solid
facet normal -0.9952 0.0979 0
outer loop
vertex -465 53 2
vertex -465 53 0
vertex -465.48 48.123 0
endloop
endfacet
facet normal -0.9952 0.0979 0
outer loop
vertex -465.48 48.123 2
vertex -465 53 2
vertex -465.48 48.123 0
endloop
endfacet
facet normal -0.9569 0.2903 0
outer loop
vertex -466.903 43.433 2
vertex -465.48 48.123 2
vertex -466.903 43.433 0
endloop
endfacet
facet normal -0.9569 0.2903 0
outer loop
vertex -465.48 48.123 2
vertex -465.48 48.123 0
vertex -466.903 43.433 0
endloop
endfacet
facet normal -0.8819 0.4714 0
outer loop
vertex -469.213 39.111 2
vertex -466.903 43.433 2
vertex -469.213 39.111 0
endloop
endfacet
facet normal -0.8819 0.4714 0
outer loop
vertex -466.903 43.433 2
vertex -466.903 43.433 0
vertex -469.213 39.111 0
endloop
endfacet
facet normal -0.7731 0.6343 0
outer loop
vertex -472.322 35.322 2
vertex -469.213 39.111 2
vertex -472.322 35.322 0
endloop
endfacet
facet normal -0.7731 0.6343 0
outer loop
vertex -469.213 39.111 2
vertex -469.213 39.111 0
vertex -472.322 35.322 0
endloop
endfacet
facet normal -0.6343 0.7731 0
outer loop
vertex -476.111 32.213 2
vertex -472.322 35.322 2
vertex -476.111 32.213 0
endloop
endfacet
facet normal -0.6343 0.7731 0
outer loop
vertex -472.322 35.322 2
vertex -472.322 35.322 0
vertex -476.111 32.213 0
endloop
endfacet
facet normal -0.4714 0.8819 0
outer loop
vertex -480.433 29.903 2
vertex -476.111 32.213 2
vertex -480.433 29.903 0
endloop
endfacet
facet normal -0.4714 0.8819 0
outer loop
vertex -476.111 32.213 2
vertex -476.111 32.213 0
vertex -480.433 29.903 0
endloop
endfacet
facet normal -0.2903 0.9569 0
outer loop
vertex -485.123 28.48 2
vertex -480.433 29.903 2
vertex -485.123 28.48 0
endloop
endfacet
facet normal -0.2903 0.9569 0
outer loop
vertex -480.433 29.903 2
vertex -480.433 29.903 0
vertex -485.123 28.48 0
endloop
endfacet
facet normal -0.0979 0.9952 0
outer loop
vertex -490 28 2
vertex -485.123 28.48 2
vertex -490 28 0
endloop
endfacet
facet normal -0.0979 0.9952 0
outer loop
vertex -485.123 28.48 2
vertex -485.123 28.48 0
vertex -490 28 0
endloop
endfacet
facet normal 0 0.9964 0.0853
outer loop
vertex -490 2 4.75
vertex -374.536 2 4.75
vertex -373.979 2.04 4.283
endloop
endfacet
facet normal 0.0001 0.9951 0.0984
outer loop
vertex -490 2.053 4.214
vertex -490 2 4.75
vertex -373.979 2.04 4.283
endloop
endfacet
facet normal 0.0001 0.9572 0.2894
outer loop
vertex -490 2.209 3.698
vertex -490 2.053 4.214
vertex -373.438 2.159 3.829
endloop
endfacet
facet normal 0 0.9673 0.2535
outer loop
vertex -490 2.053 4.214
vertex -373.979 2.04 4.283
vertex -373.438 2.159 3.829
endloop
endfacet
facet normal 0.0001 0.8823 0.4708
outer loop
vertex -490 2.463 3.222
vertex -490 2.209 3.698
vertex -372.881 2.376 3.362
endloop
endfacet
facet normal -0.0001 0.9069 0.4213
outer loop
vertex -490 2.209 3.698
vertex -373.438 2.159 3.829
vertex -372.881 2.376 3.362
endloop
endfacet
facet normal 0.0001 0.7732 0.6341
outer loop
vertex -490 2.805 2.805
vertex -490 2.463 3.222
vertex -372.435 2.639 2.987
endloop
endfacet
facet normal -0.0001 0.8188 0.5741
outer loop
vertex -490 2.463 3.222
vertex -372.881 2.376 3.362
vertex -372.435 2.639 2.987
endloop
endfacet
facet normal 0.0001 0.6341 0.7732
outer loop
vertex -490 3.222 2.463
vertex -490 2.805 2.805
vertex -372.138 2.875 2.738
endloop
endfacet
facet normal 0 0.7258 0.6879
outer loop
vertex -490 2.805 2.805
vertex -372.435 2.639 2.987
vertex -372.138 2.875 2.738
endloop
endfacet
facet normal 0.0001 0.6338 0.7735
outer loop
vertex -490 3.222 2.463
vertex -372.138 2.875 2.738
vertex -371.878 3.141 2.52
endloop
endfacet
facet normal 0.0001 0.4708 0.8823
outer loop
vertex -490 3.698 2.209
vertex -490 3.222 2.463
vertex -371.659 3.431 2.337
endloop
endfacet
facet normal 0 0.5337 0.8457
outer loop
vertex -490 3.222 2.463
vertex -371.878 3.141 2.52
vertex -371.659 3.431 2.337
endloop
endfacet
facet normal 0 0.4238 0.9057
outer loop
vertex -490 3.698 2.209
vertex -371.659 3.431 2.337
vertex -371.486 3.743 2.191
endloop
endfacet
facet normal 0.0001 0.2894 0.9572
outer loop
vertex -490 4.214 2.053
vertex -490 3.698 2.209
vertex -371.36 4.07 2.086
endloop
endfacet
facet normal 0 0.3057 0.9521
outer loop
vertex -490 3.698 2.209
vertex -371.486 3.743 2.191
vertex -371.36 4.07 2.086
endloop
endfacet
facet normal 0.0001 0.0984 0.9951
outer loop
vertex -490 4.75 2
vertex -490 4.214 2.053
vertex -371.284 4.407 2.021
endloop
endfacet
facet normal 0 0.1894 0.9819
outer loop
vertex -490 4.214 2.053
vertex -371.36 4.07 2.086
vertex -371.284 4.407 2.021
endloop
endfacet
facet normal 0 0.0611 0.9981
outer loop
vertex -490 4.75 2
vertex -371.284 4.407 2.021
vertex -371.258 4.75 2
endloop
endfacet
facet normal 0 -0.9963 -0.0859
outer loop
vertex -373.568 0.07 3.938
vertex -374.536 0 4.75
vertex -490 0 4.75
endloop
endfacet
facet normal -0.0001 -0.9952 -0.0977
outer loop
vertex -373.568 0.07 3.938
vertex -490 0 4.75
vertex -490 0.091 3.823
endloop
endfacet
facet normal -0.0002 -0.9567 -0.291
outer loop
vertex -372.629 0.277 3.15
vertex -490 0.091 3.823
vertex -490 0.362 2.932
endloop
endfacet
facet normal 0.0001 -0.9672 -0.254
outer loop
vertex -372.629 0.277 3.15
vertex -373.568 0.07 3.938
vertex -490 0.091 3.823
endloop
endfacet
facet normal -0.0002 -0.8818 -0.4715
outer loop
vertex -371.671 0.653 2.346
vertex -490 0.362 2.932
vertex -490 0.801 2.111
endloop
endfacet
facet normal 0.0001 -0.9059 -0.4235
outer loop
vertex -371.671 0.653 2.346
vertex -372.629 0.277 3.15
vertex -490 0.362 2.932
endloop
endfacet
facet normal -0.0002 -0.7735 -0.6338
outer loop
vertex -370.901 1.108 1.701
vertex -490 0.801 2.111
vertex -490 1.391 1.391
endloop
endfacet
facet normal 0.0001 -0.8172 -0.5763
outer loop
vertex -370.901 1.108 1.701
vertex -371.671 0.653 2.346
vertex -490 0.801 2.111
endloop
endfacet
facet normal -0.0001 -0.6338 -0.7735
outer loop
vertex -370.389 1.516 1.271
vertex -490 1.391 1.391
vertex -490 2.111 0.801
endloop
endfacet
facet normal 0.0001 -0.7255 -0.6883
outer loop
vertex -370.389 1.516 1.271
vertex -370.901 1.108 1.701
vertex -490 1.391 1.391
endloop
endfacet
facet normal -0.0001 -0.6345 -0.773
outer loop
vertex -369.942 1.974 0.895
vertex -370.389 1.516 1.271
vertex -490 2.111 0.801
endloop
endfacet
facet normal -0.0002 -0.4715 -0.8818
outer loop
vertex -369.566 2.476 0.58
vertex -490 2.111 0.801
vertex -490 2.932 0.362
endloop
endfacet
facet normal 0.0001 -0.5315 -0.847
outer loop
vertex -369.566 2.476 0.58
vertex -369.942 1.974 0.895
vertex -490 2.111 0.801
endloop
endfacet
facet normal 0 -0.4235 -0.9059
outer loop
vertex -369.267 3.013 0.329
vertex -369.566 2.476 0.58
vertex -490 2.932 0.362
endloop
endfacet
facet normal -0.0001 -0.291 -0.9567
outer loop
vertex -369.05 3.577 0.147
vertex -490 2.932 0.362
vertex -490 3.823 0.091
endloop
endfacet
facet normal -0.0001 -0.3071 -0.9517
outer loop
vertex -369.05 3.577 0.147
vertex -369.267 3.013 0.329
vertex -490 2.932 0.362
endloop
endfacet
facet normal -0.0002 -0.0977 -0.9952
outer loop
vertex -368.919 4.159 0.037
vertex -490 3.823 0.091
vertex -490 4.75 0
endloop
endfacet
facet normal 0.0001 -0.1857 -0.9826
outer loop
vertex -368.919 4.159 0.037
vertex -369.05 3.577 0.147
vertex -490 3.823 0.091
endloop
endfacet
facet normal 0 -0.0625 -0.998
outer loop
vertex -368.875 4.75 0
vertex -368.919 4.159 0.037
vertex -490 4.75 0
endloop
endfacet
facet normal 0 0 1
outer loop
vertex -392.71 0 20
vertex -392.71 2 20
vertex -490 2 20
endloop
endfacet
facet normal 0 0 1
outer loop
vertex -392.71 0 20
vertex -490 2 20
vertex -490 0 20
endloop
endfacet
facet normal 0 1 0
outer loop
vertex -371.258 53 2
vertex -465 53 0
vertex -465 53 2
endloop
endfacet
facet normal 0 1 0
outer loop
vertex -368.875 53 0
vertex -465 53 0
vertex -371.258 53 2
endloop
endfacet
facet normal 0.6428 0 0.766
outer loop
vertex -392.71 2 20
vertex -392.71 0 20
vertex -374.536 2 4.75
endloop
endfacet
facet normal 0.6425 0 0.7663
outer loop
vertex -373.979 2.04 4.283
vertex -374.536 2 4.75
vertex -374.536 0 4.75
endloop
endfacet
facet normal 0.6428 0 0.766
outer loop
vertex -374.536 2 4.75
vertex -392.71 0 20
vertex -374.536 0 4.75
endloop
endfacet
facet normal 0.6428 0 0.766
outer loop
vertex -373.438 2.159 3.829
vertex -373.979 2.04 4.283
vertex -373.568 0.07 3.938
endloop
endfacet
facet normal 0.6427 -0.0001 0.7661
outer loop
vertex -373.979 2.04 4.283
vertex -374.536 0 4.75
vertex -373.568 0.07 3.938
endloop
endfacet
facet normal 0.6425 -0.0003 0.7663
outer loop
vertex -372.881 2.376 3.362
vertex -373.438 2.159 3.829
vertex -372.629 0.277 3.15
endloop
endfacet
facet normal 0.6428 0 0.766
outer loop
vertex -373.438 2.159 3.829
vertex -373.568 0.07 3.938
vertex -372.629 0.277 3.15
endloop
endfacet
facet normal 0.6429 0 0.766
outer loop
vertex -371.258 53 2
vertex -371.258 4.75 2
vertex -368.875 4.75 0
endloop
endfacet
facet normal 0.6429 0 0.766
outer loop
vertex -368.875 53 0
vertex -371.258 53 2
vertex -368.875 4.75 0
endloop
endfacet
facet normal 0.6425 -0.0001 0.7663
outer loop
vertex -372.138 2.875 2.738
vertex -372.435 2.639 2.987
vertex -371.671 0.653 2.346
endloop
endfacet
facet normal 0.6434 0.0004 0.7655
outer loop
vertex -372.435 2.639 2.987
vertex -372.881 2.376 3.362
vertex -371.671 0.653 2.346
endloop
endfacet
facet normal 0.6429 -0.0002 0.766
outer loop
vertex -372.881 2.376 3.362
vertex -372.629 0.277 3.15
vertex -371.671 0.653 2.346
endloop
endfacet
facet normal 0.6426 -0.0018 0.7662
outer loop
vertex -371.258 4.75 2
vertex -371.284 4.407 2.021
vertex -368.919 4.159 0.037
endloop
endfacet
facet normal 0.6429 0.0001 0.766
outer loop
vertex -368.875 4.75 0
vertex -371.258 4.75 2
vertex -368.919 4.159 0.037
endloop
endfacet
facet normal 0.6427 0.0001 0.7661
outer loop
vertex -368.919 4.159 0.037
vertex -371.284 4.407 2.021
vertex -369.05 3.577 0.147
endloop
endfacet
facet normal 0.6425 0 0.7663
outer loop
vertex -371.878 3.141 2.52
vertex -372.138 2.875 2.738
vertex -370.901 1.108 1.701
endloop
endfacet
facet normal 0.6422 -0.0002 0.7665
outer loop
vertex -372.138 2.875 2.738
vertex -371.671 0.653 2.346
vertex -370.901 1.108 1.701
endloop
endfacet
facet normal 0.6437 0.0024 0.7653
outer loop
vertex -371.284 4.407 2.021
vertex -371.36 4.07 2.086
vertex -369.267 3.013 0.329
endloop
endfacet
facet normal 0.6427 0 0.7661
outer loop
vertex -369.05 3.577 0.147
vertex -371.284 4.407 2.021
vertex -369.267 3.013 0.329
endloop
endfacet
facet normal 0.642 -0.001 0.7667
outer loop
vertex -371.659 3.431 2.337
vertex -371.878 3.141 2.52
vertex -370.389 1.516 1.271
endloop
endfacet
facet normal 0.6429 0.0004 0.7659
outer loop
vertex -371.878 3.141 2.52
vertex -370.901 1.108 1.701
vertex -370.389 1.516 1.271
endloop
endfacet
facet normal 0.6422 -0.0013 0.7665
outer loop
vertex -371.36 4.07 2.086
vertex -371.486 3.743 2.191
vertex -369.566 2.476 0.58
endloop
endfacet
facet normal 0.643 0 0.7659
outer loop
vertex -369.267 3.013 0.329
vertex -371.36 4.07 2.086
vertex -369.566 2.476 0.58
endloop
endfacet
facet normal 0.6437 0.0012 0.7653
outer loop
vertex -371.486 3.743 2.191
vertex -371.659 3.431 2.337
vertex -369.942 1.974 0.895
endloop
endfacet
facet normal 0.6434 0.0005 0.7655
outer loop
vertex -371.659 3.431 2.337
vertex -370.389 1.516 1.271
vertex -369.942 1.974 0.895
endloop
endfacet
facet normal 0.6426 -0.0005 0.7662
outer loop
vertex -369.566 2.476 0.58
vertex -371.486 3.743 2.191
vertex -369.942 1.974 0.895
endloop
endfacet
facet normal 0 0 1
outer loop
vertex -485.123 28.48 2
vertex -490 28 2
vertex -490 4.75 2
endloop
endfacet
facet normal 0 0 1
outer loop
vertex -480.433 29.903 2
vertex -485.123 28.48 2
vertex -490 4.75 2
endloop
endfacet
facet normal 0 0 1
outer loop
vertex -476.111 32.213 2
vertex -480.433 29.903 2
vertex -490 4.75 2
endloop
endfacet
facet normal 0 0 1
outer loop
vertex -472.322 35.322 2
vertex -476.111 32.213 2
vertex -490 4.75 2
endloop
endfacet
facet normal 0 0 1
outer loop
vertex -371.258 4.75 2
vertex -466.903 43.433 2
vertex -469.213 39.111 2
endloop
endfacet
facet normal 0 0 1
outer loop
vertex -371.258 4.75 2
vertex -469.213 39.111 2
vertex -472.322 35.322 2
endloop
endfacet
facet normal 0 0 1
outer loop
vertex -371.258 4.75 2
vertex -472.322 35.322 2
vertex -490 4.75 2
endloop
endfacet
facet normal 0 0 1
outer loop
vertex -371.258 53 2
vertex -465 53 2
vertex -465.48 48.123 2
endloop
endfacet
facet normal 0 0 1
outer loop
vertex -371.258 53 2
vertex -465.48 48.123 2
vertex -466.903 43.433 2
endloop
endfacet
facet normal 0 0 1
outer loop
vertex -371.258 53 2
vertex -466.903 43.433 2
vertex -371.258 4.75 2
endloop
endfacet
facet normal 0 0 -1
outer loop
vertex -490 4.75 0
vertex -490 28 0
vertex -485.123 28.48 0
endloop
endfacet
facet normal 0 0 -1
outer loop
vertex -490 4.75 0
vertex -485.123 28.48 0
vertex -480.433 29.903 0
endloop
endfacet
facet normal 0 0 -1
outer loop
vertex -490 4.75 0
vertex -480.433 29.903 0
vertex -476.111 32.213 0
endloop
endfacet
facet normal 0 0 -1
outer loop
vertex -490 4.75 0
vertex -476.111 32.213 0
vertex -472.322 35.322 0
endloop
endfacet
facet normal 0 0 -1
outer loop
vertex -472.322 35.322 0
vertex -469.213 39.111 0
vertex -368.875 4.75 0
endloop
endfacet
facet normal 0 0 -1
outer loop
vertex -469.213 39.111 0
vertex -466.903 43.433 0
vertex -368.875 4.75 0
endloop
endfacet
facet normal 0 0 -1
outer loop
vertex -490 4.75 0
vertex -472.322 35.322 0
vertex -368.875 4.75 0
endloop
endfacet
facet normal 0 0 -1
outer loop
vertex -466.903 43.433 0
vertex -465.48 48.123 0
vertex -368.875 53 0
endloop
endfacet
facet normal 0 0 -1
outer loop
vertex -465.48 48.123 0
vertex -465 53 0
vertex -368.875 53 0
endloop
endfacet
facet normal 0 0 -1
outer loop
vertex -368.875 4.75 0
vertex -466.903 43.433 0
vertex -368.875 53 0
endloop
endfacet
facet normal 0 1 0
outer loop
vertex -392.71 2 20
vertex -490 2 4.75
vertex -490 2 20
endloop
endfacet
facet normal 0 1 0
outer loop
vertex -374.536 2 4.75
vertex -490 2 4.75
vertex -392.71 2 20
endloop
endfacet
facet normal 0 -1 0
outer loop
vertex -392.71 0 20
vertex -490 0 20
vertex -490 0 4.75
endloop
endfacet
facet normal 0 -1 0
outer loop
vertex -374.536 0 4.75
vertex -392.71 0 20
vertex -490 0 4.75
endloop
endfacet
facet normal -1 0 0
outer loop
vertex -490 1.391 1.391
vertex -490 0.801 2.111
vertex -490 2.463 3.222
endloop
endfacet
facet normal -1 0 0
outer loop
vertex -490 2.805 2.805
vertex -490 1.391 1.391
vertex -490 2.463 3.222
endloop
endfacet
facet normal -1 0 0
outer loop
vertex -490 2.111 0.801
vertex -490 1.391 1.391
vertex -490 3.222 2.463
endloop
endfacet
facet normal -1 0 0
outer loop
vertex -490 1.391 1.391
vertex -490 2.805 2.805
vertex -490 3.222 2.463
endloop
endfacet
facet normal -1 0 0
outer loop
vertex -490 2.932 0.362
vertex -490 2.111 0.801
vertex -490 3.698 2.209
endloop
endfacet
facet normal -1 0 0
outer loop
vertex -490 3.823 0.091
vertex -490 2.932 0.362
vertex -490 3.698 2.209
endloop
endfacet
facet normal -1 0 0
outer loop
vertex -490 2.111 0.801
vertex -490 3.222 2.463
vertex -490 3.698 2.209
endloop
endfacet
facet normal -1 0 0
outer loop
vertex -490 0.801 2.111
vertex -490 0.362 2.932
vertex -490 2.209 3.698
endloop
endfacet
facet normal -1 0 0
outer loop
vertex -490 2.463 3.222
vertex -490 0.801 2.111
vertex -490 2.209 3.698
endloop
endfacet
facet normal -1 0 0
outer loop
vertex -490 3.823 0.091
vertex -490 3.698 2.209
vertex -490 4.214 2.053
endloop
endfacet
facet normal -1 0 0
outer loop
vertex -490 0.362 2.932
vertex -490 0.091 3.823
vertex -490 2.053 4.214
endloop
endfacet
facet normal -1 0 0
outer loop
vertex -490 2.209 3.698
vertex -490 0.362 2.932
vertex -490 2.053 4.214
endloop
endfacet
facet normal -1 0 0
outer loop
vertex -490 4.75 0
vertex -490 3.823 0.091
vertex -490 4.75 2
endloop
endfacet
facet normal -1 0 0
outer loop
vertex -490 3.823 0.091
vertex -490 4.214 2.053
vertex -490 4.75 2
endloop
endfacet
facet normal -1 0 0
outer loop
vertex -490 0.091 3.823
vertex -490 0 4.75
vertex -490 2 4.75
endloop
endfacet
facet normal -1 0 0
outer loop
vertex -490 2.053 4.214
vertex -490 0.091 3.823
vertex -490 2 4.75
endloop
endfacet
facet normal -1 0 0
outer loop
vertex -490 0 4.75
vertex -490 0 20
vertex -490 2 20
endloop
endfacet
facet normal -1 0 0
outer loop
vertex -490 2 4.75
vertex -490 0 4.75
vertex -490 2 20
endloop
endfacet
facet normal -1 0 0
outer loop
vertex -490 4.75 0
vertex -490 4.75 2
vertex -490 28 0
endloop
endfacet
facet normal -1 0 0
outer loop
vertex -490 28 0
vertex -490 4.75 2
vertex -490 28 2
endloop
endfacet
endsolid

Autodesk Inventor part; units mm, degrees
ref_plane "YZ Plane" through (0, 0, 0) normal (1, 0, 0) x (0, 1, 0)
ref_plane "XZ Plane" through (0, 0, 0) normal (0, 1, 0) x (-1, 0, 0)
ref_plane "XY Plane" through (0, 0, 0) normal (0, 0, 1) x (1, 0, 0)
sketch "Sketch1" plane through (0, 0, 0) normal (0, 0, 1) x (1, 0, 0)
  line L0 (-490, 53) -> (490, 53)
  line L1 (490, 53) -> (490, 0)
  line L2 (490, 0) -> (-490, 0)
  line L3 (-490, 0) -> (-490, 53)
  point P0 (0, 0)
  point P1 (0, 0)
  dimension "d0" = 980
  dimension "d1" = 53
extrude "Plate1" add sketch "Sketch1" along normal blind 2
sketch "Sketch2" plane through (490, 2, 0) normal (0, -1, 0) x (1, 0, 0)
  line L0 (-980, 0) -> (0, 0)
  line L1 (0, 0) -> (0, 20)
  line L2 (0, 20) -> (-980, 20)
  line L3 (-980, 20) -> (-980, 0)
edge flange "Flange1" height 20 angle 90 thickness 2 bend radius 2.75 thickness toward (0, -1, 0) relief round relief width 2 relief depth 1 edges at (0, 0, 2) wall of the first edge with corners at (-490, 2, 0) (490, 2, 0) (490, 2, 20) (-490, 2, 20)
bend "Bend1"
corner "Corner1"
sketch "Sketch5" plane through (0, 0, 0) normal (0, 0, -1) x (-1, 0, 0)
  line L0 (490, 53) -> (-490, 53) projected
  line L1 (490, 0) -> (-490, 0) projected
  circle A0 centre (0, 53) radius 25
  line L2 (243.95, 53) -> (246.05, 53)
  line L3 (246.05, 53) -> (246.05, 27)
  line L4 (246.05, 27) -> (243.95, 27)
  line L5 (243.95, 27) -> (243.95, 53)
  line L6 (-243.95, 53) -> (-246.05, 53)
  line L7 (-246.05, 53) -> (-246.05, 27)
  line L8 (-246.05, 27) -> (-243.95, 27)
  line L9 (-243.95, 27) -> (-243.95, 53)
  line L10 (0, 53) -> (0, 0) construction
  circle A1 centre (490, 53) radius 25
  point P0 (0, 0)
  point P1 (245, 27)
  point P2 (-245, 27)
  point P3 (246.05, 53)
  point P4 (-25, 53)
  point P5 (25, 53)
  point P6 (-246.05, 53)
  dimension "d45" = 50
  dimension "d48" = 2.1
  dimension "d49" = 490
  dimension "d51" = 27
  dimension "d52" = 26
extrude "Extrusion1" cut sketch "Sketch5" against normal through all contours L3 L4 L5 L0 | L9 L8 L7 L0 | A1
sketch "Sketch9" plane through (0, 0, 2) normal (0, 0, 1) x (1, 0, 0)
  line L0 (-389.1031, 29.596) -> (-389.1031, 17.596) construction
  line L1 (-389.1031, 17.596) -> (-589.1031, 17.596) construction
  line L2 (-589.1031, 17.596) -> (-589.1031, 29.596) construction
  line L3 (-589.1031, 29.596) -> (-389.1031, 29.596) construction
  line L4 (-490, 53) -> (490, 53) projected
  point P0 (0, 0)
  point P1 (1.05, 68)
  point P2 (490, 53)
  point P3 (-490, 53)
  dimension "d40" = 200
  dimension "d41" = 12
mark "Mark2"
sketch "Sketch10" plane through (-490, 0, 20) normal (0, -1, 0) x (1, 0, 0)
  line L0 (980, -20) -> (736.05, -20) projected
  line L1 (0, 0) -> (980, 0) projected
  line L2 (980, -20) -> (97.2902, -20)
  line L3 (97.2902, -20) -> (97.2902, 0)
  line L4 (97.2902, 0) -> (980, 0)
  line L5 (980, 0) -> (980, -20)
  line L6 (97.2902, 0) -> (121.1253, -20)
  point P0 (490, -20)
  point P1 (736.05, -20)
  dimension "d53" = 882.7098
  dimension "d54" = 50
extrude "Extrusion4" cut sketch "Sketch10" against normal through all contours L0 L2 L6 L1 L5
equation "\"d2\" = Thickness"
equation "\"d3\" = BendReliefWidth"
equation "\"d4\" = BendReliefDepth"
equation "\"d5\" = MinimumRemnant"
equation "\"d6\" = TransitionRadius"
equation "\"d9\" = BendRadius"
equation "\"d10\" = CornerReliefSize"
equation "\"d11\" = GapSize"
equation "\"d12\" = JacobiRadiusSize"
equation "\"BendReliefWidth\" = Thickness"
equation "\"BendReliefDepth\" = 0.5 * Thickness"
equation "\"CornerReliefSize\" = 4 * Thickness"
equation "\"MinimumRemnant\" = 2 * Thickness"
equation "\"TransitionRadius\" = BendRadius"
equation "\"JacobiRadiusSize\" = BendRadius"
equation "\"GapSize\" = Thickness"
equation "\"Thickness\" = 2"
equation "\"BendRadius\" = 2.75"
properties part number "MSC 330 STRINGER BOARD  ###" material "Stainless Steel"
